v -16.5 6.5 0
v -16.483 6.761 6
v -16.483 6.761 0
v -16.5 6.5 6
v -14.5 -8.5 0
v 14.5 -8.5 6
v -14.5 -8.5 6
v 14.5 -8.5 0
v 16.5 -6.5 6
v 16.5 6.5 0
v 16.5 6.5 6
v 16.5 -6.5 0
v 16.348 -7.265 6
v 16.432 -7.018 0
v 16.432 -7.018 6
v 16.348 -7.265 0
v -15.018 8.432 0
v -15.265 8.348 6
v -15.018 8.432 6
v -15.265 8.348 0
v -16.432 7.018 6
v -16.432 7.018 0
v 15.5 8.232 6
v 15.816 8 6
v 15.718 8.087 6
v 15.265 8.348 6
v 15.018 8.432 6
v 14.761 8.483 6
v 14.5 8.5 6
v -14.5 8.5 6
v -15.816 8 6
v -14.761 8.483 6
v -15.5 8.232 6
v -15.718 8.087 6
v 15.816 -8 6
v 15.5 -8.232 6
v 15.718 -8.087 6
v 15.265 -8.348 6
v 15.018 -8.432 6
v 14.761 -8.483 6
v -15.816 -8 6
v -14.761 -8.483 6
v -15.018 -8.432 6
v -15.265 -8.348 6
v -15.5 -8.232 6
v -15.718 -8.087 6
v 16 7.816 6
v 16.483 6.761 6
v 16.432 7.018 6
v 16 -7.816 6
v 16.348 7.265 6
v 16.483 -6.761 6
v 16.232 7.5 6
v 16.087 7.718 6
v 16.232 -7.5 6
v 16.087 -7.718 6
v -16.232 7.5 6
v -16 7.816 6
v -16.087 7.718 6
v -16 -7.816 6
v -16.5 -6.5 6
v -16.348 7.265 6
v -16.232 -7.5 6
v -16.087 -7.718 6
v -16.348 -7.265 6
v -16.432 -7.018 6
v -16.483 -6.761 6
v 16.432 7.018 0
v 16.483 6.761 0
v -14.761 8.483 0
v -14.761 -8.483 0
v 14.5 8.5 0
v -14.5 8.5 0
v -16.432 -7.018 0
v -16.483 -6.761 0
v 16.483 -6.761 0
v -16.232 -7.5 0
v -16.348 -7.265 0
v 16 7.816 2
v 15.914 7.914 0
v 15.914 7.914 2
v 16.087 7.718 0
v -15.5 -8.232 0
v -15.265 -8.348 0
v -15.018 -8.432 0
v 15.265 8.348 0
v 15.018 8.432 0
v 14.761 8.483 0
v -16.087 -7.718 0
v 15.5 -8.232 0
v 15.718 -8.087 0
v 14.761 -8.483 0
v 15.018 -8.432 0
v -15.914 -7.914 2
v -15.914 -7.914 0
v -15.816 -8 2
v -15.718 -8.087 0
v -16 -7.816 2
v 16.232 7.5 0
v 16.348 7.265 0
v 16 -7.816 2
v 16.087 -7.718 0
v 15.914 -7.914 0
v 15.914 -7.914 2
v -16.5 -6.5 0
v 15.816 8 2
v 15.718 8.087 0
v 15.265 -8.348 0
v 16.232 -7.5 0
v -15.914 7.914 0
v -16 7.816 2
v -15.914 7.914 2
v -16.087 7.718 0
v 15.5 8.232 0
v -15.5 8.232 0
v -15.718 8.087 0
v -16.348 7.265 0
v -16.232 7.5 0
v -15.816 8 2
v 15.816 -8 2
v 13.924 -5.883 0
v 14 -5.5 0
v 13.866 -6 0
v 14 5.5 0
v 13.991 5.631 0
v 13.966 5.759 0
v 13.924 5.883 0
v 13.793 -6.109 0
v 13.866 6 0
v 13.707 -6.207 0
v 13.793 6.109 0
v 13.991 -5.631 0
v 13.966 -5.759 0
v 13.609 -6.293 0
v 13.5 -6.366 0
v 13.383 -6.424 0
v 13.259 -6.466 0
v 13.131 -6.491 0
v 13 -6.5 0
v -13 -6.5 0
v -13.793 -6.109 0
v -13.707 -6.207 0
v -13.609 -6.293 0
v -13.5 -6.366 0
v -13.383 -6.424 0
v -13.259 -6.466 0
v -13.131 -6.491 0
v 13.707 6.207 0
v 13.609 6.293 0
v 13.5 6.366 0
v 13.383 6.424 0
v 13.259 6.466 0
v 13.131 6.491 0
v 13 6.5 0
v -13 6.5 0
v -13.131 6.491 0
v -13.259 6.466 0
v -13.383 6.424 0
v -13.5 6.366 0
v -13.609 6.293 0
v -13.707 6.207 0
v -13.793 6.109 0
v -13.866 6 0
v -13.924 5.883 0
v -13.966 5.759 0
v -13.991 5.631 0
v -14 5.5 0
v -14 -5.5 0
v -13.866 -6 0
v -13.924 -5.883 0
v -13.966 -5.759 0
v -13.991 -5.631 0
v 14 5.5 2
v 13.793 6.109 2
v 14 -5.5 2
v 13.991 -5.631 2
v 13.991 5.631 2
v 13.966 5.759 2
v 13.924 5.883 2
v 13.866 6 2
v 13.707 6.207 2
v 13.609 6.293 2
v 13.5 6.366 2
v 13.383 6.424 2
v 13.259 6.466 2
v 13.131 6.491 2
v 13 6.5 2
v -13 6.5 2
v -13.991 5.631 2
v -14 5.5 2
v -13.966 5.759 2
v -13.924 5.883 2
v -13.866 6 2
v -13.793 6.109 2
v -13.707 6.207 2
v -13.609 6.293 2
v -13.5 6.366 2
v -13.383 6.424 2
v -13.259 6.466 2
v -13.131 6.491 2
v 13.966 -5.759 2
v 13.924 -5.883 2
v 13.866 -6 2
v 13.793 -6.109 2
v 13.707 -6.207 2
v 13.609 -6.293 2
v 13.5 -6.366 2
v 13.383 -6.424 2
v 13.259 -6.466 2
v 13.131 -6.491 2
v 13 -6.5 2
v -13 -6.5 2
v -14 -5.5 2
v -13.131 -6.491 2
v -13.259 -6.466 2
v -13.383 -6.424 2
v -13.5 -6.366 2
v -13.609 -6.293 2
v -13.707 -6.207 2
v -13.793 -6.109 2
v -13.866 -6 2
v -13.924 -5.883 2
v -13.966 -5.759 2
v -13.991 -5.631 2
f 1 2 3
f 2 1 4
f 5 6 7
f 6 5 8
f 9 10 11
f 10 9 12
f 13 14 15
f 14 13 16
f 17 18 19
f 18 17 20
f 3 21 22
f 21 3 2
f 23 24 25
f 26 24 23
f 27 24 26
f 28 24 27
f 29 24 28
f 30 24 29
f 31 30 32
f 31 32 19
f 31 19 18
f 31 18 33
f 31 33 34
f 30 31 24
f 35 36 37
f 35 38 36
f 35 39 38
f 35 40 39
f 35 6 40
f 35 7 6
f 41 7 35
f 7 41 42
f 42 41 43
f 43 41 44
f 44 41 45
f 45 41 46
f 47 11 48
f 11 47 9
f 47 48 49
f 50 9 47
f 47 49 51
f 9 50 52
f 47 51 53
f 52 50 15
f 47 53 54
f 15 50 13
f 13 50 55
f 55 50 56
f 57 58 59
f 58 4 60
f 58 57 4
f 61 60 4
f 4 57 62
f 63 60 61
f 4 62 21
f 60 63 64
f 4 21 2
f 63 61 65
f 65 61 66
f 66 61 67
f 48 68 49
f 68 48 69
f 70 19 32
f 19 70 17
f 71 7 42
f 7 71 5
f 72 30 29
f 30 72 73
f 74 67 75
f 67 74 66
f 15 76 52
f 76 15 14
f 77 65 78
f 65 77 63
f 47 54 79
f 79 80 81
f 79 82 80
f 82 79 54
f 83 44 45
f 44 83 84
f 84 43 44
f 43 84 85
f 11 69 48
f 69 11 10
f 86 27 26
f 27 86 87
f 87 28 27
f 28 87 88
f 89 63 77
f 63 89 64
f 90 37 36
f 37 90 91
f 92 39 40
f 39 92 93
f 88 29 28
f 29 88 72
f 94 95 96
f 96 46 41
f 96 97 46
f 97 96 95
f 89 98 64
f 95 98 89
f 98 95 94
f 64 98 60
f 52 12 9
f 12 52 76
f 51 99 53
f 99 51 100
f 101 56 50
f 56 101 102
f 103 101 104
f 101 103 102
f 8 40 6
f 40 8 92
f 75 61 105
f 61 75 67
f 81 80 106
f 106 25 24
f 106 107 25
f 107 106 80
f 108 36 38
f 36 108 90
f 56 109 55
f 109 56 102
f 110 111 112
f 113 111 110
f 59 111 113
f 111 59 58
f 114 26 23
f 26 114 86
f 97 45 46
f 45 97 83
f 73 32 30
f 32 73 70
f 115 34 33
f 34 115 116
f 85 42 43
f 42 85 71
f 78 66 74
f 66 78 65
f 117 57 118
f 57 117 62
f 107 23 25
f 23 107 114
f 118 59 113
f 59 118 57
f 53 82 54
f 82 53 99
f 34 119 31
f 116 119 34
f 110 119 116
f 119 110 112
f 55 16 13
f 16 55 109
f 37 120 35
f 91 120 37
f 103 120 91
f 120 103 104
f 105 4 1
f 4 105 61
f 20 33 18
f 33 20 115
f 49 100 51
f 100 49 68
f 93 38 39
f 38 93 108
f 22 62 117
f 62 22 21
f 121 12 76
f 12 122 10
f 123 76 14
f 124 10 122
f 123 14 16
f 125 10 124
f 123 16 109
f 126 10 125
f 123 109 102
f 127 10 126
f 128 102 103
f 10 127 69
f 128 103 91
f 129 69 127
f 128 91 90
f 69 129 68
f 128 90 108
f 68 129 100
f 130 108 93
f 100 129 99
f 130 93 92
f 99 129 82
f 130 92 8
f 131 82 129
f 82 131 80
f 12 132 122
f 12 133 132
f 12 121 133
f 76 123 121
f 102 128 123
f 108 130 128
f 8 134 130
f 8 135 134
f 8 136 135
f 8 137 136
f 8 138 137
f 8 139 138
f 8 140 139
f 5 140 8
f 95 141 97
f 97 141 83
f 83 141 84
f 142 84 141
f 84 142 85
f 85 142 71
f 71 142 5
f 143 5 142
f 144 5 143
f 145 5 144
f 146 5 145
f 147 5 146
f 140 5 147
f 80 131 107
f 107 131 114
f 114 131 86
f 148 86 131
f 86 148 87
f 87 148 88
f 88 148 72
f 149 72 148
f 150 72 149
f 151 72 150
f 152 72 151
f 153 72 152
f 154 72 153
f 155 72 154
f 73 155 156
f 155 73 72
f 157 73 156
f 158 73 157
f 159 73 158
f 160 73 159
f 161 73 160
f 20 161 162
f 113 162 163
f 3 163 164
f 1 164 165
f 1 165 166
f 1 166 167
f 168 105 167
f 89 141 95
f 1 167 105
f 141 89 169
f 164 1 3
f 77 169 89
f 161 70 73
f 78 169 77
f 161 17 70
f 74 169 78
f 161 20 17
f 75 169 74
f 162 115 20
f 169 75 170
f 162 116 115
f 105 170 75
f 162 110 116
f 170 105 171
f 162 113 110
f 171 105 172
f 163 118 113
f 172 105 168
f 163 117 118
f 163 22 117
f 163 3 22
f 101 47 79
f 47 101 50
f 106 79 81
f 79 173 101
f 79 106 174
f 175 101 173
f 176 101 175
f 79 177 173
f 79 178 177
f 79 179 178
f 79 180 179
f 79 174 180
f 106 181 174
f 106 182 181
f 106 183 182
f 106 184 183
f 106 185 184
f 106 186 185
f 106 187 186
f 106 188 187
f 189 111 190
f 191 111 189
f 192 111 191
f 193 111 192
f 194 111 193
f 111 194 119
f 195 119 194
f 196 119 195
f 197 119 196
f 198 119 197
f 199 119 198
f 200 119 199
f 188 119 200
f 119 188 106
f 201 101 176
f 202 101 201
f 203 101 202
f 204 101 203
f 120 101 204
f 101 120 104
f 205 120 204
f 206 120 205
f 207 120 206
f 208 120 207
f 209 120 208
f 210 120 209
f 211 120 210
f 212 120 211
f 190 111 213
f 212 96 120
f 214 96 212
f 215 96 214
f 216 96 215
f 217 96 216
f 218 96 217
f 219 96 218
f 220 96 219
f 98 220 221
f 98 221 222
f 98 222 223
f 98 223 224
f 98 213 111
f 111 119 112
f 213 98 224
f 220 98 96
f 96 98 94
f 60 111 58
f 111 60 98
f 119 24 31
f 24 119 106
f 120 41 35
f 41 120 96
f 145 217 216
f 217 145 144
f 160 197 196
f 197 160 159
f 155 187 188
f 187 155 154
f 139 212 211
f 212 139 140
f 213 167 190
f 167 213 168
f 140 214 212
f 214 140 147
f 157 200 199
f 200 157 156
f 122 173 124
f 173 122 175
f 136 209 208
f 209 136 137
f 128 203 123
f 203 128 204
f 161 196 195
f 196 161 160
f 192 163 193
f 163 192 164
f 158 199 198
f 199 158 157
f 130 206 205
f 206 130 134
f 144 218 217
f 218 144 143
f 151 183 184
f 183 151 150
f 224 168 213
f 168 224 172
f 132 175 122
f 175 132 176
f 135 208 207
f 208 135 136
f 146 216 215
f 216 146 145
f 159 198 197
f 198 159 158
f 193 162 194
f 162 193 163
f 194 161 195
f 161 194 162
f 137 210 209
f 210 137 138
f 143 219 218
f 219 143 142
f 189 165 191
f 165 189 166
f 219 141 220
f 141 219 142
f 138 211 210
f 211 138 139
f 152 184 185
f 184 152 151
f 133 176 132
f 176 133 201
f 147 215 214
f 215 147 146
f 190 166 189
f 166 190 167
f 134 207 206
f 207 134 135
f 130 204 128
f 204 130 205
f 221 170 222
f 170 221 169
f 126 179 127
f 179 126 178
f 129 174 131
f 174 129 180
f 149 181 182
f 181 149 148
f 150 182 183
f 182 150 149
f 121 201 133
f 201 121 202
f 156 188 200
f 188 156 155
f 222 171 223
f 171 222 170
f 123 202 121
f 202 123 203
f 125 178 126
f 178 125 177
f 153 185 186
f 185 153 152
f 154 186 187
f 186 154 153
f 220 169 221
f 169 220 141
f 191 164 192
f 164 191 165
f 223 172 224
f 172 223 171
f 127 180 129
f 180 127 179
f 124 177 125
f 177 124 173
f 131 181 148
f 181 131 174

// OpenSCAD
// file: parameters.scad
// ============================================
// MODULAR CABLE ORGANIZER - SHARED PARAMETERS
// ============================================
// All dimensions in mm - include this in all files
// ============================================

$fn = 48;

// === TOLERANCES ===
clearance = 0.3;
port_clearance = 0.1;  // Extra clearance for port openings (reduced - 0.2 was too loose for USB-C)
wall = 1.6;

// === SLOT DIMENSIONS (2:1 aspect ratio) - scaled to 2/3 ===
slot_width = 32;  // Reduced by 1mm for more compact insert
slot_height = 16;  // Reduced by 1mm for more compact insert
slot_depth = 4;  // Reduced from 6mm - less frame depth needed

// === FRAME STRUCTURE ===
frame_wall = 0.5;   // Reduced for more compact frame
frame_border = 8;  // Increased by 10mm for mounting holes with countersink
frame_back = 2;     // Slightly thicker for snap catch strength
mount_hole_dia = 3;
countersink_dia = 6;  // Diameter of countersink for screw heads
countersink_depth = 2;  // Depth of countersink

// === GRID ===
grid_cols = 2;
grid_rows = 2;

// === INSERT BASE DIMENSIONS ===
insert_width = slot_width - (2 * clearance);
insert_height = slot_height - (2 * clearance);
insert_base_depth = slot_depth - 0.5;

// === INSERT BODY (protrudes from frame) ===
insert_body_width = insert_width - 4;
insert_body_height = insert_height - 3;
insert_body_depth = 12;  // Deep enough to accommodate male cable connectors
insert_top_thick = 1.5;  // Top platform thickness

// === SNAP TABS (on neck/body - catch on back plate) ===
snap_tab_width = 4;
snap_tab_protrude = 1.2;  // How far tab sticks out from body
snap_tab_thick = 1.5;     // Z thickness of tab
snap_tab_offset = 2.2;      // Distance from base to tab bottom on insert (increased to clear frame)

// === CONNECTOR PORT DIMENSIONS & BODY DEPTHS ===
// Port dimensions from reference blueprints
// Body depths sized to match typical male connector lengths

// USB-C: 8.4 x 2.6mm, male connector ~9mm
usbc_w = 8.4;
usbc_h = 2.6;
usbc_r = 1.0;
usbc_body_depth = 9;

// USB-A: 14.0 x 6.5mm, male connector ~13mm
usba_w = 14.0;
usba_h = 6.5;
usba_r = 0.5;
usba_body_depth = 13;

// USB Mini: 6.9 x 3.0mm, male connector ~9mm
usb_mini_w = 6.9;
usb_mini_h = 3.0;
usb_mini_r = 0.5;
usb_mini_body_depth = 9;

// USB Micro: 6.9 x 1.8mm, male connector ~7mm
usb_micro_w = 6.9;
usb_micro_h = 1.8;
usb_micro_r = 0.3;
usb_micro_body_depth = 7;

// USB-B: 8.0 x 7.5mm, male connector ~14mm
usb_b_w = 8.0;
usb_b_h = 7.5;
usb_b_r = 1.0;
usb_b_body_depth = 14;

// Lightning: 6.7 x 1.5mm, male connector ~8mm
lightning_w = 6.7;
lightning_h = 1.5;
lightning_r = 0.5;
lightning_body_depth = 8;

// HDMI: 14.0 x 4.5mm, male connector ~16mm
hdmi_w = 14.0;
hdmi_h = 4.5;
hdmi_r = 0.5;
hdmi_body_depth = 16;

// 3.5mm Audio Jack: male plug ~14mm
audio_jack_dia = 6.0;
audio_jack_body_depth = 14;

// Blank/Label: recessed area for label
label_w = 30;
label_h = 12;
label_depth = 0.8;

// === CALCULATED VALUES ===
frame_total_depth = frame_back + slot_depth;
grid_width = (grid_cols * slot_width) + ((grid_cols - 1) * frame_wall);
grid_height = (grid_rows * slot_height) + ((grid_rows - 1) * frame_wall);
frame_width = grid_width + (2 * frame_border);
frame_height_total = grid_height + (2 * frame_border);
insert_total_depth = insert_base_depth + insert_body_depth;
// main file
// ============================================
// MODULAR CABLE ORGANIZER - SINGLE SLOT FRAME
// ============================================
// Simple frame with internal lip for snap retention
// Print flat side down (no supports needed)
// ============================================

include <parameters.scad>

// --- Main Module ---
module single_slot_frame() {
    outer_w = slot_width + (2 * frame_wall);
    outer_h = slot_height + (2 * frame_wall);
    
    difference() {
        // Outer body
        rounded_box_rect(outer_w, outer_h, frame_total_depth, 2);
        
        // Main slot cutout (from back to front)
        translate([0, 0, frame_back + slot_depth/2 + 0.1])
            cube([slot_width, slot_height, slot_depth + 0.2], center=true);
        
        // Back opening (smaller, for insert body to pass through)
        // Leaves material for snap tabs to catch on
        translate([0, 0, -0.1])
            rounded_box_rect(insert_body_width + 2*clearance, 
                            insert_body_height + 2*clearance, 
                            frame_back + 0.2, 1);
    }
}

// --- Utility: Rounded Box (rectangular) ---
module rounded_box_rect(w, d, h, r) {
    translate([0, 0, h/2])
        hull() {
            for (x = [-1, 1], y = [-1, 1])
                translate([x * (w/2 - r), y * (d/2 - r), 0])
                    cylinder(h=h, r=r, center=true);
        }
}

// --- Render ---
single_slot_frame();
